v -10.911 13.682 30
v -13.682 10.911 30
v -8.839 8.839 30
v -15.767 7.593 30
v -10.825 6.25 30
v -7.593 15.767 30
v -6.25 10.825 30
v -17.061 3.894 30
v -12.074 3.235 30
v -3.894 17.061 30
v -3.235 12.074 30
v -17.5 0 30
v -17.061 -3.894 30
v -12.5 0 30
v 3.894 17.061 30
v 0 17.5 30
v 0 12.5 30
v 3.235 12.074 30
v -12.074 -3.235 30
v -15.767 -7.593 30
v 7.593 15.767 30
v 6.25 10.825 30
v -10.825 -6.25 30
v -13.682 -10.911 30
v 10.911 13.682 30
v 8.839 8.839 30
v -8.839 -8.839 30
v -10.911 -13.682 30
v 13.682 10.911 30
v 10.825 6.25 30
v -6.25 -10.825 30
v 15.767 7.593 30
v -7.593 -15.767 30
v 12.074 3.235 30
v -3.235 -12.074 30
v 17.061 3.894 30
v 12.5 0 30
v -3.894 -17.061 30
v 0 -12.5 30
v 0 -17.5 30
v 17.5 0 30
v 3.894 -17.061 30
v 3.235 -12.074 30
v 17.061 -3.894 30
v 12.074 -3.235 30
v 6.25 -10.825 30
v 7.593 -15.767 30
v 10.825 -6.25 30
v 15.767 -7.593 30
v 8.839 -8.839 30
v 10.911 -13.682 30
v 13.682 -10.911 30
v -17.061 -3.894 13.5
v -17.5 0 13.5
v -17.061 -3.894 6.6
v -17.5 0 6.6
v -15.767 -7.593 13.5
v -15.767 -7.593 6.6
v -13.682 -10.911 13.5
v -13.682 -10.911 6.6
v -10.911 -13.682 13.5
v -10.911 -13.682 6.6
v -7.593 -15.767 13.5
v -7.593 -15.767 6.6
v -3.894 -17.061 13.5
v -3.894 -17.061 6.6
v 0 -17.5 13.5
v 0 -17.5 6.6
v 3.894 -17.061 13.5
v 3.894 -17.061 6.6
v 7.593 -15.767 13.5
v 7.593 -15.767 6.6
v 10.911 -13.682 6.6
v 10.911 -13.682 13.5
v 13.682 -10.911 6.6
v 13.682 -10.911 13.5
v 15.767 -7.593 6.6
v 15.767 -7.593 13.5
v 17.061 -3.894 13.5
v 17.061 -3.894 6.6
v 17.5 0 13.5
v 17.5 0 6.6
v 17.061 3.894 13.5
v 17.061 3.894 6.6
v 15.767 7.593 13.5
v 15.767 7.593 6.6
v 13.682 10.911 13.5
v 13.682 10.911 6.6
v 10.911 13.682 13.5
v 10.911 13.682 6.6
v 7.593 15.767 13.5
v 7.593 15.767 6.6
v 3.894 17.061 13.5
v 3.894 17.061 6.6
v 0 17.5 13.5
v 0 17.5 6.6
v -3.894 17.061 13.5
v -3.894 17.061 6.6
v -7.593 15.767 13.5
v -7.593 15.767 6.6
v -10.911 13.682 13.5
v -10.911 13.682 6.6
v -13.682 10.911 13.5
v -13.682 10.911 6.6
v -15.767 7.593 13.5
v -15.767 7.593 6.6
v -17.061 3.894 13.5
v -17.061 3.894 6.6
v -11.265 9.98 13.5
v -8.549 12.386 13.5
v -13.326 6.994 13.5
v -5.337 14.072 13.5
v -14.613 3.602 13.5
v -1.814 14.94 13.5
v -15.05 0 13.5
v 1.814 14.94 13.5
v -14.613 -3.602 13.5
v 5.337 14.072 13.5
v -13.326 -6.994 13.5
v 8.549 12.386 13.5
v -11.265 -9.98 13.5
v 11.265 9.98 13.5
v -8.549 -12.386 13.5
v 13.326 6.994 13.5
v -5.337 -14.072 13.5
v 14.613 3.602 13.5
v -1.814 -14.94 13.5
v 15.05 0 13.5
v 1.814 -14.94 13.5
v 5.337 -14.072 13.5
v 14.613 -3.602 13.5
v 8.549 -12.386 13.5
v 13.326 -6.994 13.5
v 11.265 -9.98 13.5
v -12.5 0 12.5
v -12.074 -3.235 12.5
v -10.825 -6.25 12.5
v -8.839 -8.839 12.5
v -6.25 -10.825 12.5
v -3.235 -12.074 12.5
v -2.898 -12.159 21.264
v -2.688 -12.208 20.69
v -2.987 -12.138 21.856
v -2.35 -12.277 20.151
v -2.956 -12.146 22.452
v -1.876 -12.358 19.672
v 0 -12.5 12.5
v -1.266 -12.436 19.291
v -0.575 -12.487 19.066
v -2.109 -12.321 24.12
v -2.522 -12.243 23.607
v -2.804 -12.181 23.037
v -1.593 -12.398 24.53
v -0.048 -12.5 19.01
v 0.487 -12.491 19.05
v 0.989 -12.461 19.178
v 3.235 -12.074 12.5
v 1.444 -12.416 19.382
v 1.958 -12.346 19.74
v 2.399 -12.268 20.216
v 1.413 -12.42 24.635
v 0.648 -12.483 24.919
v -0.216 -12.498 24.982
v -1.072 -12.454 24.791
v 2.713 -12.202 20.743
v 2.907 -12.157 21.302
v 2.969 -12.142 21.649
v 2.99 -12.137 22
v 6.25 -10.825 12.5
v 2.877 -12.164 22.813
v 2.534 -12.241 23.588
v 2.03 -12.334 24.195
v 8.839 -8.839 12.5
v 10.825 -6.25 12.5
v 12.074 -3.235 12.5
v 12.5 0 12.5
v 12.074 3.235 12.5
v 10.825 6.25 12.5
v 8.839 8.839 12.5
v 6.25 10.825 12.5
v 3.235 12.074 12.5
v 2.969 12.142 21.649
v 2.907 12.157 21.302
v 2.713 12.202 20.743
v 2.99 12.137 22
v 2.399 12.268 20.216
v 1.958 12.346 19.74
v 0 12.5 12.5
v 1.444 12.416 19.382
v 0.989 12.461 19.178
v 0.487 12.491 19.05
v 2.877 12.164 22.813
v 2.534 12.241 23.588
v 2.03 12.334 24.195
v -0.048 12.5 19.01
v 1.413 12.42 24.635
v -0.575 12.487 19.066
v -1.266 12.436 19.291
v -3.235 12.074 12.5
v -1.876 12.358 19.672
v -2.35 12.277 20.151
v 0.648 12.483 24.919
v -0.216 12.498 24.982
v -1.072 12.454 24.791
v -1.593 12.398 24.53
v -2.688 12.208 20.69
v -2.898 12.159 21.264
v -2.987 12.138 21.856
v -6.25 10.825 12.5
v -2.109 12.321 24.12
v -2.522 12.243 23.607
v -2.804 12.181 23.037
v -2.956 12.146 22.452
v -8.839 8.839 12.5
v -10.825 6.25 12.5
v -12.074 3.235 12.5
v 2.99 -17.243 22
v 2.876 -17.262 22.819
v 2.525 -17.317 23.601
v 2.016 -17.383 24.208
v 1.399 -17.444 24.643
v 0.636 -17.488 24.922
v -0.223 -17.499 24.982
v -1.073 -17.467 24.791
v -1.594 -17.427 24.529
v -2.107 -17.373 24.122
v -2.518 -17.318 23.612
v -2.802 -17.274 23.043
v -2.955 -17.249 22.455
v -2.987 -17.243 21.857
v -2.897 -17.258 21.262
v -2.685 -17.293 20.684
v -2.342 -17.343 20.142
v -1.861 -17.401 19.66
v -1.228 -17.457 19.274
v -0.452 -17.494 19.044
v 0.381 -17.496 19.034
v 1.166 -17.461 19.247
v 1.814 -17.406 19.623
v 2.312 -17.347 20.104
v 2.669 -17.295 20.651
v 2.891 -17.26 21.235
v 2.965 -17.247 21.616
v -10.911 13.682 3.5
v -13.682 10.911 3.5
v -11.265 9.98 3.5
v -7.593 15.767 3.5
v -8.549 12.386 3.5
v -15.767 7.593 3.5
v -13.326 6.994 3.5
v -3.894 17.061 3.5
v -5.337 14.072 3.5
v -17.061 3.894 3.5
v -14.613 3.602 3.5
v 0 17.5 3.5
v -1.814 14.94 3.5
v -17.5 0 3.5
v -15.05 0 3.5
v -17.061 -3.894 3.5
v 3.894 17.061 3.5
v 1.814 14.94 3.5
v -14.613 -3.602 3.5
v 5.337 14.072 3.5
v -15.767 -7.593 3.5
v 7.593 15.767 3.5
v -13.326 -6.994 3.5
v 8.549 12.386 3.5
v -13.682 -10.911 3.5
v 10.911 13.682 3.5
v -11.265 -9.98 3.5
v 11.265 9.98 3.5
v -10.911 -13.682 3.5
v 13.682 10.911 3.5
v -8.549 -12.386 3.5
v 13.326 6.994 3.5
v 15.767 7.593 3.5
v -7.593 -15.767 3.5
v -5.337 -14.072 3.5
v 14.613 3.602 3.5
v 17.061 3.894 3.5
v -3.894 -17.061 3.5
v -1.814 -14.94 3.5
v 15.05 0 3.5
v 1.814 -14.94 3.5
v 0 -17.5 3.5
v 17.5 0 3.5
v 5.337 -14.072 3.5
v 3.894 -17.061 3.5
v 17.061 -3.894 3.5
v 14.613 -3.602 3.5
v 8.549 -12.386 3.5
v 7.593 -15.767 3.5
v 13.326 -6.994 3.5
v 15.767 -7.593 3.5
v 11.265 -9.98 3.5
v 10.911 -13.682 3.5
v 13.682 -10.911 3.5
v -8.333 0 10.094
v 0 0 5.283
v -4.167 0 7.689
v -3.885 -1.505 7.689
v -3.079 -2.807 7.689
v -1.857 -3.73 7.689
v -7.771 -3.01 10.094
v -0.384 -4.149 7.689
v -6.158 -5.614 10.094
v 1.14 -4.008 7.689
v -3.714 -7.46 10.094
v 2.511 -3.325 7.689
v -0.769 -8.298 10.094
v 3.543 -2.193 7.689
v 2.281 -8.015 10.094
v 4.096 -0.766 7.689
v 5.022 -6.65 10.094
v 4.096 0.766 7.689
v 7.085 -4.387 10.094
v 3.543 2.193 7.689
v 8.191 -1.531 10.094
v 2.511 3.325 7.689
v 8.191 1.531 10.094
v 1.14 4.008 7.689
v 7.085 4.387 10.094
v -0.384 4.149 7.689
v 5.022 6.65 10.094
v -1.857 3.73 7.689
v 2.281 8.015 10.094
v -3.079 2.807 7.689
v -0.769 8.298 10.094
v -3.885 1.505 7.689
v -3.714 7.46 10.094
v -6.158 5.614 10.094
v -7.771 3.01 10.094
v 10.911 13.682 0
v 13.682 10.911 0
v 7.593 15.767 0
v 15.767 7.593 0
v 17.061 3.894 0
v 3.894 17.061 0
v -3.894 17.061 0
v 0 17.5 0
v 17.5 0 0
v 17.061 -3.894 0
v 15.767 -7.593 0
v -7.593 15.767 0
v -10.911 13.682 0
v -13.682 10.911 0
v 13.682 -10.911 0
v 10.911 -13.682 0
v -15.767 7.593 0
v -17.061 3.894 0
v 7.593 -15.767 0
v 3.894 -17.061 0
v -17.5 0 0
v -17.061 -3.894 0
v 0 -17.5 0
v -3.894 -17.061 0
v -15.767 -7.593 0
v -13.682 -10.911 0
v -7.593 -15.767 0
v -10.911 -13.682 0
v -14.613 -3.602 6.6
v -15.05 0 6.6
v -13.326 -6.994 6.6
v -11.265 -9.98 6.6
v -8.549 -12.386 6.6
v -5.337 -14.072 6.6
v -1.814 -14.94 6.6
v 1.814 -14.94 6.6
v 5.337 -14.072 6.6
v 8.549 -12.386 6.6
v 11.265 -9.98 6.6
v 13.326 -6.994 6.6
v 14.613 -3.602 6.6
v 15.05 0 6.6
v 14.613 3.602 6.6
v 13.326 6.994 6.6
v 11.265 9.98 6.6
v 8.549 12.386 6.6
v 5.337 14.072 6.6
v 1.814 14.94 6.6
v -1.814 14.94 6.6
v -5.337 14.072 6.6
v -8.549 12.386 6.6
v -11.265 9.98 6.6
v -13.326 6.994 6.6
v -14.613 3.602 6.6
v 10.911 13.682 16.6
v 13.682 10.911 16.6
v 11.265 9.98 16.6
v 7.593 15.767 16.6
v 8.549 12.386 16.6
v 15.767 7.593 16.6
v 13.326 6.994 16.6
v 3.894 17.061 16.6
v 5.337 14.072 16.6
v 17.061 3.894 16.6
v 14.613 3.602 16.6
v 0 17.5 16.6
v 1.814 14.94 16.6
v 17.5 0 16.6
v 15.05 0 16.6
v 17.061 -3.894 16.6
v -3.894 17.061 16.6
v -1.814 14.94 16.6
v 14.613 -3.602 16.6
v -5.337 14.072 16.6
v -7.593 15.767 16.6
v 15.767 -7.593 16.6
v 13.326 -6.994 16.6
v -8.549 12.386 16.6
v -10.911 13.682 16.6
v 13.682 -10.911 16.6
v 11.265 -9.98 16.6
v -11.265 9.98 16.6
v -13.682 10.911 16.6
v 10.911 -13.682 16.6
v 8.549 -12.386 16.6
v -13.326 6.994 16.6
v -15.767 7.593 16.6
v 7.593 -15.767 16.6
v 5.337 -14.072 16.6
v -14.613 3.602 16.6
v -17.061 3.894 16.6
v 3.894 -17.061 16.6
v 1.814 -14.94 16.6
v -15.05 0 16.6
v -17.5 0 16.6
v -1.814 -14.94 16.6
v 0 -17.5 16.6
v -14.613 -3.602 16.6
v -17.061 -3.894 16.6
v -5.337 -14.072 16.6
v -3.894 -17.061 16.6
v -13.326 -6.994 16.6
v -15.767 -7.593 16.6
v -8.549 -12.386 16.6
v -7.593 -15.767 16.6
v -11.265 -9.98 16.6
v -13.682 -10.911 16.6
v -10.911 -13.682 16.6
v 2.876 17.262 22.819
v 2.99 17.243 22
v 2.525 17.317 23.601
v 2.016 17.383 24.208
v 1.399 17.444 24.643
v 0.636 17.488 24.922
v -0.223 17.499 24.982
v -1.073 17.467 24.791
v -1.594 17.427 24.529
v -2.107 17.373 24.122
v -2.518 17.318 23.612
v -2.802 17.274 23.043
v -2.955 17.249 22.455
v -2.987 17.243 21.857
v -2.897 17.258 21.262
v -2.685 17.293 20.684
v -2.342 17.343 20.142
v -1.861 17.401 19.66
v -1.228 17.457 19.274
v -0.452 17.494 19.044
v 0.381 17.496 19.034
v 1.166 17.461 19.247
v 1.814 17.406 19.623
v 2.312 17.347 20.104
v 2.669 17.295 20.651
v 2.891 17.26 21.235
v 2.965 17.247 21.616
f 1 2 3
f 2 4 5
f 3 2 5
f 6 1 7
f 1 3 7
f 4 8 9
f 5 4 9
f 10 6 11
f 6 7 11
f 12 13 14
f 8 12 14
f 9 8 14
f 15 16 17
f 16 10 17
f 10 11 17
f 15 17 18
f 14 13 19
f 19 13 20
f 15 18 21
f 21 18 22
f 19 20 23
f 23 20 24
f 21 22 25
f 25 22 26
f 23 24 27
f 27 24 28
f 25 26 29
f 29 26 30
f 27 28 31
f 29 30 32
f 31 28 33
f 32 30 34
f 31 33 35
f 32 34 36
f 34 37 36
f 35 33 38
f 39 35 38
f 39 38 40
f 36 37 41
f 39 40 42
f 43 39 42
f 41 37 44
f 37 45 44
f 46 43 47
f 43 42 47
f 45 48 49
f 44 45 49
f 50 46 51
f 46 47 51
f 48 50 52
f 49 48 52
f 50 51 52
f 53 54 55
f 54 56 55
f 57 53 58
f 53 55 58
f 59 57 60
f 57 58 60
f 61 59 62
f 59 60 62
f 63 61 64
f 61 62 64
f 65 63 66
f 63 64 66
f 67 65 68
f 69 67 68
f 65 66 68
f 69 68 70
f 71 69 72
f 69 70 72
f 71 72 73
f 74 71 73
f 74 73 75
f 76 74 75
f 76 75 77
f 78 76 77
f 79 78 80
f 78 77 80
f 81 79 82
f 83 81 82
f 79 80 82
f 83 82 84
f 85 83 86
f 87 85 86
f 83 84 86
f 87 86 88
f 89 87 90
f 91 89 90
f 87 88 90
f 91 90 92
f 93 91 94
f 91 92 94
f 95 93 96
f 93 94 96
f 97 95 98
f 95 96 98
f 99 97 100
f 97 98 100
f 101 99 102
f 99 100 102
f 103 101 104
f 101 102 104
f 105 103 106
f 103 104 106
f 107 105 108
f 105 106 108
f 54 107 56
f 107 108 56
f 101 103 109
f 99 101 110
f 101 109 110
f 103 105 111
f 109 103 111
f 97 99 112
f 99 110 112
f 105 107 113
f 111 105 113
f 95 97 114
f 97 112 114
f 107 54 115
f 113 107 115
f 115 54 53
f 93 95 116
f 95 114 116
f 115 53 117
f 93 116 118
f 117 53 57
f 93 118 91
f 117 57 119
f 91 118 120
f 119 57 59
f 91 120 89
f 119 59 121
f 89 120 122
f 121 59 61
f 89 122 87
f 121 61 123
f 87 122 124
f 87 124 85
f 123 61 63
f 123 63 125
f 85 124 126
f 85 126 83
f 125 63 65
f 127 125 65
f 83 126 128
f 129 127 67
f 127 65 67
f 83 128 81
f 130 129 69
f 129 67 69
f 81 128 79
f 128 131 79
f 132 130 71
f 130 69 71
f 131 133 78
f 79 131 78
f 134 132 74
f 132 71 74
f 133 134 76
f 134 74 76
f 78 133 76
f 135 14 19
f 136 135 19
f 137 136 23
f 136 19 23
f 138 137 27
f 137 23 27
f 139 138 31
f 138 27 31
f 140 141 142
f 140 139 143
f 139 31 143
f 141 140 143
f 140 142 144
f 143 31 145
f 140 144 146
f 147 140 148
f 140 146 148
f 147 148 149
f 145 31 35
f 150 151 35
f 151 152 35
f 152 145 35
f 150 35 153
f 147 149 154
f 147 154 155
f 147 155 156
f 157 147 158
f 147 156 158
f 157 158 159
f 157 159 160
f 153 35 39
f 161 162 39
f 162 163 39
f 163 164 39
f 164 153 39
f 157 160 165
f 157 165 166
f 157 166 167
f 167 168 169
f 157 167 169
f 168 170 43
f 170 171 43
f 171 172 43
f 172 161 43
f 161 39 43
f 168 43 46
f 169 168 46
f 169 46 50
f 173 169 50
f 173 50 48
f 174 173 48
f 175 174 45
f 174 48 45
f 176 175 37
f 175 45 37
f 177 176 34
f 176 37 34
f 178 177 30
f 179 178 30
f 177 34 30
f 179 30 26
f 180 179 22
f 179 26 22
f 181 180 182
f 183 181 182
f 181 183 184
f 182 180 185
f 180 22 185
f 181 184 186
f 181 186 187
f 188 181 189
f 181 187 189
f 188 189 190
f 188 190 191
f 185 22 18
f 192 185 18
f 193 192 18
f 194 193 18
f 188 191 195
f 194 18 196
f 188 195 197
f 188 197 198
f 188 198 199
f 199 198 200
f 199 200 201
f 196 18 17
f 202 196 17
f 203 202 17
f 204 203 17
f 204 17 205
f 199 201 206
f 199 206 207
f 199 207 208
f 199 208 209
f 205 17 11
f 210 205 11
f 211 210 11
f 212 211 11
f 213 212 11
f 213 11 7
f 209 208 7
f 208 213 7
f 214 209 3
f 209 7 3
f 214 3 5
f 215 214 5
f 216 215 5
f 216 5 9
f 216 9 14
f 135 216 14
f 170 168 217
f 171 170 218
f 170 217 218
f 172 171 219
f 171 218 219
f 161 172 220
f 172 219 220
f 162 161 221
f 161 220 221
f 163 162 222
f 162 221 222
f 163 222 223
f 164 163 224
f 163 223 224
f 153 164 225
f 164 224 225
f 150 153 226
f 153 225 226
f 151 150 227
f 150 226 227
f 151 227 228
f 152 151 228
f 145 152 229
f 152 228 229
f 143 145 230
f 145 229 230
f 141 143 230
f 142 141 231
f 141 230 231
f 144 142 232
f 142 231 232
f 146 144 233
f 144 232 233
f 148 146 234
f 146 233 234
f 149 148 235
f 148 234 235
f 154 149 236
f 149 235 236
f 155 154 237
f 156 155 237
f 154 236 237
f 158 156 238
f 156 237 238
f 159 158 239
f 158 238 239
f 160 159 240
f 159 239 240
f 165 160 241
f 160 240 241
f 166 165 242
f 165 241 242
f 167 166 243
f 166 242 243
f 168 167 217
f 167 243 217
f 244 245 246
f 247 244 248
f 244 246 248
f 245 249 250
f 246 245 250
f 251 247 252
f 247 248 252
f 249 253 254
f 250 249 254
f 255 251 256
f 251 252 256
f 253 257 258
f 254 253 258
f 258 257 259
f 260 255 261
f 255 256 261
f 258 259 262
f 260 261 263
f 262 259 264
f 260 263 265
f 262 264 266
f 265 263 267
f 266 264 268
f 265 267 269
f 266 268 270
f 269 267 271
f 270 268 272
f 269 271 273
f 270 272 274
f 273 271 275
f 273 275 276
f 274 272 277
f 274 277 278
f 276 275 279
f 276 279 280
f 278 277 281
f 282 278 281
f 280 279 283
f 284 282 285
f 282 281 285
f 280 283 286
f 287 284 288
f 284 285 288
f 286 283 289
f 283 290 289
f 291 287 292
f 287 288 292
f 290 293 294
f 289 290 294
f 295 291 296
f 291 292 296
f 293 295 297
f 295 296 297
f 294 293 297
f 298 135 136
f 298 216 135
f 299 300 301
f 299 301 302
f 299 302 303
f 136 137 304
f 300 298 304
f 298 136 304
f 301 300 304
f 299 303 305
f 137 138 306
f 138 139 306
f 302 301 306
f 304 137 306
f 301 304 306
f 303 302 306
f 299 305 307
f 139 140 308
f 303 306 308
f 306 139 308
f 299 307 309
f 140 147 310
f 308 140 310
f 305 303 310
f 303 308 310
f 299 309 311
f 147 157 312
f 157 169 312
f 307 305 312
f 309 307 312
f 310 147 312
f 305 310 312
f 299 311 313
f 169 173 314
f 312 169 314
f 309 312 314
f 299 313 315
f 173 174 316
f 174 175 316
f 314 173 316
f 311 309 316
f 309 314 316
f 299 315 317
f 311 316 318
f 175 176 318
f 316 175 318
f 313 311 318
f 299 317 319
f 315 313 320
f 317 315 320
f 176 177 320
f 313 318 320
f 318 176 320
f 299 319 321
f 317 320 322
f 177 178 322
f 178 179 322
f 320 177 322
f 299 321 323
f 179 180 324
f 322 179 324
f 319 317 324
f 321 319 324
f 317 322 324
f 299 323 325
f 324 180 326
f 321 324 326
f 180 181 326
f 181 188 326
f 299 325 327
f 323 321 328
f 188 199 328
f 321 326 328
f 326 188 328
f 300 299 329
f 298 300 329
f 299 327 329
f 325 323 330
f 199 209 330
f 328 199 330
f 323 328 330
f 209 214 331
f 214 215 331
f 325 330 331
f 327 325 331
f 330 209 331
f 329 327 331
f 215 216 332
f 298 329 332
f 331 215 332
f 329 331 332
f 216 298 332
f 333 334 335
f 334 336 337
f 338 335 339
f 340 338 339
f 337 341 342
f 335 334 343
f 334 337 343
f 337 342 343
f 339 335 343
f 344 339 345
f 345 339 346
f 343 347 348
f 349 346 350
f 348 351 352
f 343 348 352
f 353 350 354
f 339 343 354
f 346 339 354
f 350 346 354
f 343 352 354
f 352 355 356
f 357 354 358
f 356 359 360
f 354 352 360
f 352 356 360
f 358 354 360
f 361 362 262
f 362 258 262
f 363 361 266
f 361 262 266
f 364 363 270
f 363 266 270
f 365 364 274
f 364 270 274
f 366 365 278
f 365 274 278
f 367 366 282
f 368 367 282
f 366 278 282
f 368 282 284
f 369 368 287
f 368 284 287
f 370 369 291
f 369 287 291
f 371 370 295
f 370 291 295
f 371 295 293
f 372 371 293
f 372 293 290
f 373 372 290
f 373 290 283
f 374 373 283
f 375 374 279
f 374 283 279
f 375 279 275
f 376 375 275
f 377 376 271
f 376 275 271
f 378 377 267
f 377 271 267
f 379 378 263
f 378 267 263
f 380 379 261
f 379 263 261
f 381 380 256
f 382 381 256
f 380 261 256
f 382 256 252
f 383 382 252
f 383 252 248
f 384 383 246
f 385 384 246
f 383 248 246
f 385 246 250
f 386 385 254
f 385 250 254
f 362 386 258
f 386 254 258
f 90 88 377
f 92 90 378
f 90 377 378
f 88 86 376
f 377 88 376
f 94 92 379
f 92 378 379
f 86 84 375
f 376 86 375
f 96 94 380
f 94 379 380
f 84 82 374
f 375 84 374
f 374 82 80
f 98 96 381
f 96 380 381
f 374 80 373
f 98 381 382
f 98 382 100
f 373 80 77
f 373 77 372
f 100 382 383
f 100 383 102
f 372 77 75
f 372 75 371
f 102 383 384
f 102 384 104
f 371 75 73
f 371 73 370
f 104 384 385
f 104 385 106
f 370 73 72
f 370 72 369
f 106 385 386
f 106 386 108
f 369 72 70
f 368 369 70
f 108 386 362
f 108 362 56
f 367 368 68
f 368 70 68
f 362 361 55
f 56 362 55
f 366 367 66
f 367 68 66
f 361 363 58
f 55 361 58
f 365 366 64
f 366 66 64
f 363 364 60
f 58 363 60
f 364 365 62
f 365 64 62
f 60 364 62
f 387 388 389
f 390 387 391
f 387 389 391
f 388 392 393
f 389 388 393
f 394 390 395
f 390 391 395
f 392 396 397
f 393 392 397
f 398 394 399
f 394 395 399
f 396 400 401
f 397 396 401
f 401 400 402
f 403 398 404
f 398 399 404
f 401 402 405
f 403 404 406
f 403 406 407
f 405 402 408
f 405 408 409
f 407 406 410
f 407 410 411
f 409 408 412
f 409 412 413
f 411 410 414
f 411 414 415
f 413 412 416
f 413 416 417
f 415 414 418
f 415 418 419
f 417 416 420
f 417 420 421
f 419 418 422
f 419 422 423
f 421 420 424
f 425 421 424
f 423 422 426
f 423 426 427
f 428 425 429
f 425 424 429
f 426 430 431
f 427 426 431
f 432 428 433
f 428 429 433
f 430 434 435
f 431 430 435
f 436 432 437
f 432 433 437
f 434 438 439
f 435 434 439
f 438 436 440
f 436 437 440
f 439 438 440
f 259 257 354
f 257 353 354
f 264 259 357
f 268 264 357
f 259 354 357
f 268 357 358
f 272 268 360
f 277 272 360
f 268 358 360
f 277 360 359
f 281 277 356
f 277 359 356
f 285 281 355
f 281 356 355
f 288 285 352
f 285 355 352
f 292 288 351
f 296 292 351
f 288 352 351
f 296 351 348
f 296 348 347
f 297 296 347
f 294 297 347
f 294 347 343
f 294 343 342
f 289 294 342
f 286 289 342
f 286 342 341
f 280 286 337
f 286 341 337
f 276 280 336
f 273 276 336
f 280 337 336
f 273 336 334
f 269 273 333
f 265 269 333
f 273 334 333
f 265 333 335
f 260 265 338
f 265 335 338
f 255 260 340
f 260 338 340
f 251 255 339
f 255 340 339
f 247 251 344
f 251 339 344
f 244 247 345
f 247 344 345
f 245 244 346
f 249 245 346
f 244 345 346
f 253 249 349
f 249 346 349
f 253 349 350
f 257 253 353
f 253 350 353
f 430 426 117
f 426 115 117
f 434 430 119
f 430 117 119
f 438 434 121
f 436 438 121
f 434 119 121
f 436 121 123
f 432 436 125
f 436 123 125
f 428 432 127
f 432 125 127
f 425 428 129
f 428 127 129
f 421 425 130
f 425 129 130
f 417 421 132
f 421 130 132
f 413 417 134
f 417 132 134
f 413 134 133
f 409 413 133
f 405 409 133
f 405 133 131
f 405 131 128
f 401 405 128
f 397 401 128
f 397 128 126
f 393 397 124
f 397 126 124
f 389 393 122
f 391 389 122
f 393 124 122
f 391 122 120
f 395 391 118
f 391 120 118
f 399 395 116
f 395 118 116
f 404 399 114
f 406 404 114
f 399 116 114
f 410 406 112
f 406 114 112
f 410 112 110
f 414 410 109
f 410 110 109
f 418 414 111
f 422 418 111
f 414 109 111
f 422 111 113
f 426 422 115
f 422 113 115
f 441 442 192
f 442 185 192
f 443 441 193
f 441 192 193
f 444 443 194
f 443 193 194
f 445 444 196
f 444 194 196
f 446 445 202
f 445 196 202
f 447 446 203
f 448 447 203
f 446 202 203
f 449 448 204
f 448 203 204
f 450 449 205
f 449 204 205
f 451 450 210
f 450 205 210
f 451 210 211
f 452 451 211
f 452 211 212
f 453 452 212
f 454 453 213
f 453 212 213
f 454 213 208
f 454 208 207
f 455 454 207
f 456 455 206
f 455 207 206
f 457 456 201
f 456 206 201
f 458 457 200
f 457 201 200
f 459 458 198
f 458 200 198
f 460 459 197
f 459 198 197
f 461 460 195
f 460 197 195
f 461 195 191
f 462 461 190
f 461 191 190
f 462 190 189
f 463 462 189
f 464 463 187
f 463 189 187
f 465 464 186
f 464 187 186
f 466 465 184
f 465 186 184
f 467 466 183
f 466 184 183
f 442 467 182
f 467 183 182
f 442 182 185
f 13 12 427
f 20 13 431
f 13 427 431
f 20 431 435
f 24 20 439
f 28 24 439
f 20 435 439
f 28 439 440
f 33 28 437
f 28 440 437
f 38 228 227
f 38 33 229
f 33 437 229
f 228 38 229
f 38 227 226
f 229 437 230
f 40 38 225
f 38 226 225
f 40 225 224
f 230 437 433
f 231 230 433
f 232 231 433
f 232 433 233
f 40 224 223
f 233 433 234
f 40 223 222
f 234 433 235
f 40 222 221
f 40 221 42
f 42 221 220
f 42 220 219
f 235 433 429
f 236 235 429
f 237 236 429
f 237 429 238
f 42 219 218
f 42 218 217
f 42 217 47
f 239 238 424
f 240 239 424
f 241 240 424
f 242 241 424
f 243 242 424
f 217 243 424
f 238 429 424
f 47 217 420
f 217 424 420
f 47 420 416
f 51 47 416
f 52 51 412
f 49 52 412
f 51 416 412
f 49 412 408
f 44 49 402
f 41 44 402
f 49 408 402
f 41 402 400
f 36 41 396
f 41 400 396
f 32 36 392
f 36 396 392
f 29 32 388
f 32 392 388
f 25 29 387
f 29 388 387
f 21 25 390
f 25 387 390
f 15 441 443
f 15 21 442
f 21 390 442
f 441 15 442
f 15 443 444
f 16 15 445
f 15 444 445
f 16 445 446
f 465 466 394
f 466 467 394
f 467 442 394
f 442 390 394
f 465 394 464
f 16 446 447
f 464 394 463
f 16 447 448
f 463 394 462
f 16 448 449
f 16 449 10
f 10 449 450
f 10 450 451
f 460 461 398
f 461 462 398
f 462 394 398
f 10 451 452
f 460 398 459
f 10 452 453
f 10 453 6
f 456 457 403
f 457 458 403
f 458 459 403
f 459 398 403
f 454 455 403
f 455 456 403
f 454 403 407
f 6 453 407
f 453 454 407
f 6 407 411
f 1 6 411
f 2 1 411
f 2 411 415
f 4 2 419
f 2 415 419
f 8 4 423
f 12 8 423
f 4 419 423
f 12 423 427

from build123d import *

# Parameters (mm, degrees)
F2_R     = 2.99
F3_DEPTH = 20


with BuildPart() as f1:
    # F0 (on Front) → F1 (revolve)
    with BuildSketch(Plane.XZ):
        Polygon((-17.5, 0), (0, 0), (0, 5.283122), (-12.5, 12.5), (-12.5, 30), (-17.5, 30), (-17.5, 16.6), (-15.05, 16.6), (-15.05, 13.5), (-17.5, 13.5), (-17.5, 6.6), (-15.05, 6.6), (-15.05, 3.5), (-17.5, 3.5), align=None)
    revolve(axis=Axis((0, 0, 2.641561), (0, 0, 1)))

    # F2 (on Front) → F3 (cut, symmetric)
    with BuildSketch(Plane.XZ):
        with Locations((0, 22)):
            Circle(F2_R)
    extrude(amount=F3_DEPTH, both=True, mode=Mode.SUBTRACT)


solid = f1.part
